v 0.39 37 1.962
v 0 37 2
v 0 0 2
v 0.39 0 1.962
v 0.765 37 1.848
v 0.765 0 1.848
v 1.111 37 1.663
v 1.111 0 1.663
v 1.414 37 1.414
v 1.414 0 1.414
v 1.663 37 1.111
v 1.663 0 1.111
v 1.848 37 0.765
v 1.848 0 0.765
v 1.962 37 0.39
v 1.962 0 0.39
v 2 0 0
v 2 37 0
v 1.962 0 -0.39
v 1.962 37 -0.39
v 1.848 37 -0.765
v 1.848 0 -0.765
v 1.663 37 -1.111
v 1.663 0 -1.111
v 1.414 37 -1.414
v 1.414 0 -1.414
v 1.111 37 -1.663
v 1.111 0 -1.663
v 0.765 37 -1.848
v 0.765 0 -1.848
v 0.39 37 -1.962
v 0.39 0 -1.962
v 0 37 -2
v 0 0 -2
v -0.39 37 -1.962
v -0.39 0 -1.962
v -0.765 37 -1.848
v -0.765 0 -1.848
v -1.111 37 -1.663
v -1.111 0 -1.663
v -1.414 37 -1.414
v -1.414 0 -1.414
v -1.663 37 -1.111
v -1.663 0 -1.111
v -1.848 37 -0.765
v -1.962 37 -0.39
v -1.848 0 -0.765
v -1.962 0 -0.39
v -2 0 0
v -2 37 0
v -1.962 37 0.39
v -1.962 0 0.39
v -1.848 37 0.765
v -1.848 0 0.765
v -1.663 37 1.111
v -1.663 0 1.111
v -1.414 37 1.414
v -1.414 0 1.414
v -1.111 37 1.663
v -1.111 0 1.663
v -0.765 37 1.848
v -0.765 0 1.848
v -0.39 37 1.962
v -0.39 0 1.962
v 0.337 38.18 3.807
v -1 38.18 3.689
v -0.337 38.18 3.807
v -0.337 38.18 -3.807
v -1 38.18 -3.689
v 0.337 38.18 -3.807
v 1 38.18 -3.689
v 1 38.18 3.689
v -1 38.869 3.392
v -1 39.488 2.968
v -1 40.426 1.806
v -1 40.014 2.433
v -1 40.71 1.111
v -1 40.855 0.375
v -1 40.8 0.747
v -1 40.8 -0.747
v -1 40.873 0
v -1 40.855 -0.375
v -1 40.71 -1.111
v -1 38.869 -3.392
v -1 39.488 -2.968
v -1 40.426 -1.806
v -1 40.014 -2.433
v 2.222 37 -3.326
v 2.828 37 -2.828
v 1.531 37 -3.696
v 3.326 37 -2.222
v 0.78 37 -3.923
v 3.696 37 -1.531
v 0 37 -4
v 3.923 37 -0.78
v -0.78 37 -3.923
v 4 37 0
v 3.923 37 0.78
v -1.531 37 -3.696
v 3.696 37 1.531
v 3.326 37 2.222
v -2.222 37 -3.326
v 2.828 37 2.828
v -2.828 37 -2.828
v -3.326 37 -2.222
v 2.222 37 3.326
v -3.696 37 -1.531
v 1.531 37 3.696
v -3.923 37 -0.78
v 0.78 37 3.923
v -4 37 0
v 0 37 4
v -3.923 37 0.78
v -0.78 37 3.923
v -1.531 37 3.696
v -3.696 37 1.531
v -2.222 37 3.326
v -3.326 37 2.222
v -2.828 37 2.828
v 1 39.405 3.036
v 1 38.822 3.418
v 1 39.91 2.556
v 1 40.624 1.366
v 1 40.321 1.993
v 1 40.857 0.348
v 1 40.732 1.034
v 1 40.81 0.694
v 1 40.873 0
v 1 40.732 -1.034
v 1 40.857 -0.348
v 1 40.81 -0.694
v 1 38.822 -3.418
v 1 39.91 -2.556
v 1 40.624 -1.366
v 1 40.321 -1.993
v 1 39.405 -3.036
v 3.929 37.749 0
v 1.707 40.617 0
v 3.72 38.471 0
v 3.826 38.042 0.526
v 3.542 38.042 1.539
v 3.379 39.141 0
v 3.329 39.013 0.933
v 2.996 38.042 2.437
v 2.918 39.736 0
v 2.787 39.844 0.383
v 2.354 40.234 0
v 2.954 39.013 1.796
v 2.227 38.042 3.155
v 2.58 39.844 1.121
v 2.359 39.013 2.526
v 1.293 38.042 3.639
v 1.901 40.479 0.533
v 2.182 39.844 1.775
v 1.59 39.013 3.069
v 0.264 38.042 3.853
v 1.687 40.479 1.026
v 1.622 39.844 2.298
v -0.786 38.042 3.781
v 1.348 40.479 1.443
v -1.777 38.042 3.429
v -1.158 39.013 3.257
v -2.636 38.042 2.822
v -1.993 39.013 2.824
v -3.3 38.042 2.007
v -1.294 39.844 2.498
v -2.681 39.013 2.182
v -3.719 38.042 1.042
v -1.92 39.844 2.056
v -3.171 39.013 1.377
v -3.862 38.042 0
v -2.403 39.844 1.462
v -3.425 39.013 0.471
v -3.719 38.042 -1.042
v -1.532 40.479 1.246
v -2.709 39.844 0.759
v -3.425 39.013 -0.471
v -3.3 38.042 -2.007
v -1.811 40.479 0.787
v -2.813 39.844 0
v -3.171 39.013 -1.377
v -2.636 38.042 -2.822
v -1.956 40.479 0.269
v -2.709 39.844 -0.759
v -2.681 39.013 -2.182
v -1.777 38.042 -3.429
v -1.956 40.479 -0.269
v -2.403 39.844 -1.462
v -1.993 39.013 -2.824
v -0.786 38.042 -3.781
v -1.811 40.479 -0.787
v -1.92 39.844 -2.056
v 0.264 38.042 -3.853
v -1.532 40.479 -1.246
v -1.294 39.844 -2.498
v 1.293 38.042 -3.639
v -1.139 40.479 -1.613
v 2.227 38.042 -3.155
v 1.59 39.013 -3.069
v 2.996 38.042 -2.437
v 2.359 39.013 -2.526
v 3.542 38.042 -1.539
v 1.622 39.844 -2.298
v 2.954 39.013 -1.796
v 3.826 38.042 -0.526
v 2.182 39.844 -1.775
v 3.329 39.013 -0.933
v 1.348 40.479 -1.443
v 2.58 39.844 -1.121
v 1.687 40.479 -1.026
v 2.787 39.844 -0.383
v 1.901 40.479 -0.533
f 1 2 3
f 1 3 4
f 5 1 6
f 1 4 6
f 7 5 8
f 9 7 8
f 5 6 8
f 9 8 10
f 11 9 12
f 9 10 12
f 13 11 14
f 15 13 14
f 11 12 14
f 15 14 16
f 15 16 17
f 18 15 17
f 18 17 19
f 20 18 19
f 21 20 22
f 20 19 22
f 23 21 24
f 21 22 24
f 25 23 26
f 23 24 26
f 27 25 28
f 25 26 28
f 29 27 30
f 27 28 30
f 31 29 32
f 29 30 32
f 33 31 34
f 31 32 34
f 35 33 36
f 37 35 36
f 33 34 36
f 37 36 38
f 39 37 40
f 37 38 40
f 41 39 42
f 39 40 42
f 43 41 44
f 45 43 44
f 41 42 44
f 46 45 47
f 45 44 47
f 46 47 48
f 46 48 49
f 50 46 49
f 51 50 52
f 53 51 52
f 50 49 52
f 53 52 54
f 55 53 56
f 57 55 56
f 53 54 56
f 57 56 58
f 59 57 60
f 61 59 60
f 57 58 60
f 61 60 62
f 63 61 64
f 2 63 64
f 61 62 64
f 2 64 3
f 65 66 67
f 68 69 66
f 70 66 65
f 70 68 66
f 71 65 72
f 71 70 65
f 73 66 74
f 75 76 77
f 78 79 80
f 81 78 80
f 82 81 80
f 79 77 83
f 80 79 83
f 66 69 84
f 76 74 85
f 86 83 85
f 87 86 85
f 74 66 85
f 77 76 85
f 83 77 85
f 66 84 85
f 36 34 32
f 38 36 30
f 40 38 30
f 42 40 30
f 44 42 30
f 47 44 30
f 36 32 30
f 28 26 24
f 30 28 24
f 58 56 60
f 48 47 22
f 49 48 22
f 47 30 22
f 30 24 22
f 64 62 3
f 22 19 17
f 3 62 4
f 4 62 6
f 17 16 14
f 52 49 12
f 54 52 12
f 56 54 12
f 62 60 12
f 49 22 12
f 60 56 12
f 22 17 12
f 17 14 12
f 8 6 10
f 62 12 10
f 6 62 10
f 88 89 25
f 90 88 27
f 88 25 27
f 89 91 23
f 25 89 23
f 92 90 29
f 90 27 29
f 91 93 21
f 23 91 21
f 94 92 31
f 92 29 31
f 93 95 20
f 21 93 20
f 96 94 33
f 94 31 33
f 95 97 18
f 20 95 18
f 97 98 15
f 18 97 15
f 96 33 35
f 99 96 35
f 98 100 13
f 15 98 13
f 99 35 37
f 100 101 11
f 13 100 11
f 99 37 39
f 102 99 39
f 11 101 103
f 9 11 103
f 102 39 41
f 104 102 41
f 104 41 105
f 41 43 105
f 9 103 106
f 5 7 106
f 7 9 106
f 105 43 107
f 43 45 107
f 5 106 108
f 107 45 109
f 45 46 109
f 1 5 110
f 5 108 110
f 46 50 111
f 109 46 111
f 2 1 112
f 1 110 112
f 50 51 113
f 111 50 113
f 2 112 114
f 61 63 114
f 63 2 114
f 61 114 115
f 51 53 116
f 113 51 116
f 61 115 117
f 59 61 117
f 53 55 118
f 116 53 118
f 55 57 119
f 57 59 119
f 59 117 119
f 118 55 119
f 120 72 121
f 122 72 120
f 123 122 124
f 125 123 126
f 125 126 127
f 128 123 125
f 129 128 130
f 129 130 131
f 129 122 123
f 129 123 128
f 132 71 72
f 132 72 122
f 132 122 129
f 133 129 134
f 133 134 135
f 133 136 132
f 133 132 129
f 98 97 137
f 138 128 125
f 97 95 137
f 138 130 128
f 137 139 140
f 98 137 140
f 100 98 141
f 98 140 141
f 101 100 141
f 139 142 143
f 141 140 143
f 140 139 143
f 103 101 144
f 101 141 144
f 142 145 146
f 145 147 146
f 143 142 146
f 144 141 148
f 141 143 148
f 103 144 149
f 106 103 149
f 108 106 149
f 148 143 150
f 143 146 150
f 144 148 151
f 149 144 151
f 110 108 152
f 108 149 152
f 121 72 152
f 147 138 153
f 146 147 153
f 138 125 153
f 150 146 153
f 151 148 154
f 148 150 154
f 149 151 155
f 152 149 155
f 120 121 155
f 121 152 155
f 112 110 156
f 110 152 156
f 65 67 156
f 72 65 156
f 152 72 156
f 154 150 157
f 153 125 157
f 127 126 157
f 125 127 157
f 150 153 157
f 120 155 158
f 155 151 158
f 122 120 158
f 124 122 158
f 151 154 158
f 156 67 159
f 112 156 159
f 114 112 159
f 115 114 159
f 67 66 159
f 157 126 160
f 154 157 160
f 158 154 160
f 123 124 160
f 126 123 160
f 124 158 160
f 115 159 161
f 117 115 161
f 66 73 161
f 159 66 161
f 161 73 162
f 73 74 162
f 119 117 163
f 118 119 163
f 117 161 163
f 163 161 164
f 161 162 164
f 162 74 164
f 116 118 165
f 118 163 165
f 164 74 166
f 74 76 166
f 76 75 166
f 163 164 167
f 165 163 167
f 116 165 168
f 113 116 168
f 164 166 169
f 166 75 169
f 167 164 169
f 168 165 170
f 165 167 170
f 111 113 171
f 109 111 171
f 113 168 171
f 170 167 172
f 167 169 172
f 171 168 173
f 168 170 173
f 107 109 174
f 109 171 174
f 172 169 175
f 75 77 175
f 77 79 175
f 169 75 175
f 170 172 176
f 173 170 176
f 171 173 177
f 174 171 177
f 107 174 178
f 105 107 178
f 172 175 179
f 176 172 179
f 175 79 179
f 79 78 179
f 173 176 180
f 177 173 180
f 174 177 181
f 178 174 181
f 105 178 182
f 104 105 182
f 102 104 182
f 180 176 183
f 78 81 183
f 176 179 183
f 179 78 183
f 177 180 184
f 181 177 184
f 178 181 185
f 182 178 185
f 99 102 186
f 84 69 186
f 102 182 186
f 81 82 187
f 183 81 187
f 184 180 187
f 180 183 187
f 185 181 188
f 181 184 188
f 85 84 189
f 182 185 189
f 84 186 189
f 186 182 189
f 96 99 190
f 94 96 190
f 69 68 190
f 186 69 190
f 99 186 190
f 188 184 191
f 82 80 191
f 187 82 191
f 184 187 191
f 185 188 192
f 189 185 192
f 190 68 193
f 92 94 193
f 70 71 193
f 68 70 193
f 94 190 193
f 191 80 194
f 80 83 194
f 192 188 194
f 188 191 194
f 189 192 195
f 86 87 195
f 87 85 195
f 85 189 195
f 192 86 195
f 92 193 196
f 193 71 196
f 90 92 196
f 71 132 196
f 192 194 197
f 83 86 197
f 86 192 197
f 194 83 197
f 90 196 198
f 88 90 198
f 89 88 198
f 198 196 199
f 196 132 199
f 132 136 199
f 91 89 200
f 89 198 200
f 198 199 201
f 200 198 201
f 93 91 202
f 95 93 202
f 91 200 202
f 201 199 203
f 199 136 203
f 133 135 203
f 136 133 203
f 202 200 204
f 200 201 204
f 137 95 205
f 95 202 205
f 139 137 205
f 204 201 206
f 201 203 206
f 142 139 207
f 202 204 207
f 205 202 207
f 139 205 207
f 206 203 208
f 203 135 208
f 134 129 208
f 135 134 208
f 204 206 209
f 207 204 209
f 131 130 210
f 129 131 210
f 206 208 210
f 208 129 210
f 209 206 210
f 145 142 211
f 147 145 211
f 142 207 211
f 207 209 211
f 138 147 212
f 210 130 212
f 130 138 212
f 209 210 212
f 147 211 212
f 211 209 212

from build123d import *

# Parameters (mm, degrees)
SKETCH1_R               = 2
BOSS_EXTRUDE1_DEPTH     = 37
CUT_EXTRUDE1_DEPTH      = 42.388404173
CUT_EXTRUDE1_DEPTH_BACK = 42.388404173
SKETCH3_W               = 2
SKETCH3_H               = 3.126637596


with BuildPart() as part:
    # Sketch1 → Boss-Extrude1 (new body)
    with BuildSketch(Plane(origin=(0, 0, 0), x_dir=(1, 0, 0), z_dir=(0, 1, 0))):
        with Locations(Location((0, 0, 0), (0, 0, 270))):
            Circle(SKETCH1_R)
    extrude(amount=BOSS_EXTRUDE1_DEPTH)

    # Sketch2 → Revolve1 (revolve)
    with BuildSketch(Plane.XY):
        with BuildLine():
            Line((0, 41), (0, 37))
            Line((0, 37), (4, 37))
            ThreePointArc((4, 37), (2.828427125, 39.828427125), (0, 41))
        make_face()
    revolve(axis=Axis((0, 37, 0), (0, -1, 0)))

    # Sketch3 → Cut-Extrude1 (cut, two sides: drawn at the far end of the back side and taken through both)
    with BuildSketch(Plane.XY.offset(-CUT_EXTRUDE1_DEPTH_BACK)):
        with Locations((0, 39.743318798)):
            Rectangle(SKETCH3_W, SKETCH3_H)
    extrude(amount=CUT_EXTRUDE1_DEPTH + CUT_EXTRUDE1_DEPTH_BACK, mode=Mode.SUBTRACT)


solid = part.part
